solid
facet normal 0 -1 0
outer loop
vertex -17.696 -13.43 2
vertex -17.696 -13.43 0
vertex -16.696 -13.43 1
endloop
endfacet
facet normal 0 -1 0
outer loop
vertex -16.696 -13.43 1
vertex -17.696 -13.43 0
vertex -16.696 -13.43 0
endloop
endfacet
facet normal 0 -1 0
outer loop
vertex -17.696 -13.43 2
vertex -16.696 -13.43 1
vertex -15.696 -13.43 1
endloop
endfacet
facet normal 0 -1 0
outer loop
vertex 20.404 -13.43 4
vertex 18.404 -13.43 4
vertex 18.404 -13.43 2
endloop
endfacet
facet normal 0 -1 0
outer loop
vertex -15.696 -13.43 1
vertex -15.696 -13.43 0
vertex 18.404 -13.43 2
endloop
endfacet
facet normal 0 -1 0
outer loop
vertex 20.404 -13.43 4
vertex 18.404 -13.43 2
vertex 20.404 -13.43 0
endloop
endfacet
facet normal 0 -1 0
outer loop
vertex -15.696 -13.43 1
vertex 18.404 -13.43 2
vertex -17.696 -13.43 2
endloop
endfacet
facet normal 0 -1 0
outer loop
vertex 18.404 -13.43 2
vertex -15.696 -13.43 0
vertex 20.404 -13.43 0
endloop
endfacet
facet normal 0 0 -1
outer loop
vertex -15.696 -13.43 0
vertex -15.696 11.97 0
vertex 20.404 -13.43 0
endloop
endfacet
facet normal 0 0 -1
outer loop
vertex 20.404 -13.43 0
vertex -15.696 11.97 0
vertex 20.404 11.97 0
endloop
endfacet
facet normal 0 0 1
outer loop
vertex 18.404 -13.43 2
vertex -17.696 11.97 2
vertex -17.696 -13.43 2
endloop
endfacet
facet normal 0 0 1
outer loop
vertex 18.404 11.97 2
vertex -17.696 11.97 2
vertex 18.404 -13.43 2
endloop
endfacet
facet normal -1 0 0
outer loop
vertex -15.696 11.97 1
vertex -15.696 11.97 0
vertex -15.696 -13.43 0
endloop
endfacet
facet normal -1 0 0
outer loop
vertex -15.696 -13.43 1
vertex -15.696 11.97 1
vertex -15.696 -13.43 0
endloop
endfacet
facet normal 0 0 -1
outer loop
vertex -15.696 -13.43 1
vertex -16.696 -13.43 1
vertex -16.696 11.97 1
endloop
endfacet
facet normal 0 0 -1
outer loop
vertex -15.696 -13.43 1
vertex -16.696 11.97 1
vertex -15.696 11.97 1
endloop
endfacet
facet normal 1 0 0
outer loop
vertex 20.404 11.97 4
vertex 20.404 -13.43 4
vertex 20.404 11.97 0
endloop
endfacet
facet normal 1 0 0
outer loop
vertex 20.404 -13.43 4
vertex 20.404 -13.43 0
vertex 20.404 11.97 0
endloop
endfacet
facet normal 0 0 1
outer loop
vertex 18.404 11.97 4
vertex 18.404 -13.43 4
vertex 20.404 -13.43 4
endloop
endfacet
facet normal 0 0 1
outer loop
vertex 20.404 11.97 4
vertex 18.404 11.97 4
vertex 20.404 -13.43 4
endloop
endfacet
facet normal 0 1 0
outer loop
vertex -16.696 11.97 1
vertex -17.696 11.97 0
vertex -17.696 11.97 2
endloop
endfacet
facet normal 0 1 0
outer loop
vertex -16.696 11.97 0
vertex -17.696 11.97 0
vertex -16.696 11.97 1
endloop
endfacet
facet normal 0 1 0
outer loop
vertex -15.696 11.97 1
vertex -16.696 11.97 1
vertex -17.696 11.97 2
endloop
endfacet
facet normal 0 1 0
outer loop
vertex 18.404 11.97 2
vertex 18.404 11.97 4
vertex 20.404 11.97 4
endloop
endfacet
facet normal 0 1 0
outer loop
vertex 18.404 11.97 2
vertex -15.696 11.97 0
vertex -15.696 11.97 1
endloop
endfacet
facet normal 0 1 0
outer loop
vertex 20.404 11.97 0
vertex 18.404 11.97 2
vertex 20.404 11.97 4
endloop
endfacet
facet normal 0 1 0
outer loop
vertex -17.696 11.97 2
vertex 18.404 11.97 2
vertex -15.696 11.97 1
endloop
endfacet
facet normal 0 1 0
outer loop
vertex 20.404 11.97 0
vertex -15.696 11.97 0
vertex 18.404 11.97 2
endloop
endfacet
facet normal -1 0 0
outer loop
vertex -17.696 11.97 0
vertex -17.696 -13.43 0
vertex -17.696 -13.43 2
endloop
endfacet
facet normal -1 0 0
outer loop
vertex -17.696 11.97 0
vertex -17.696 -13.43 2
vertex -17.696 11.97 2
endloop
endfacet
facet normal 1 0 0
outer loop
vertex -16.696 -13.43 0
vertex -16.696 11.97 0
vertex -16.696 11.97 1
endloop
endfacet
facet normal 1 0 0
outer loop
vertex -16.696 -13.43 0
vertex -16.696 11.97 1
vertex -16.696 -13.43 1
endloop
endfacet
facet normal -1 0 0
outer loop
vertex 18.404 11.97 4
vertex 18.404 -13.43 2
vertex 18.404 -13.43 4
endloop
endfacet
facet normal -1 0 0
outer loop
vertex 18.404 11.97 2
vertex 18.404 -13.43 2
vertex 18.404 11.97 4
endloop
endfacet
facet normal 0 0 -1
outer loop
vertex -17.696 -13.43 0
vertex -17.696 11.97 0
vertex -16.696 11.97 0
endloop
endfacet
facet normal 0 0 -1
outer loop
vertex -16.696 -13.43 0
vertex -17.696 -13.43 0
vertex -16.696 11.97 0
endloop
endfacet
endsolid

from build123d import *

# Parameters (mm, degrees)
F0_W     = 38.1
F0_H     = 25.4
F1_DEPTH = 2
F2_W     = 2
F2_H     = 25.4
F3_DEPTH = 2
F4_W     = 1
F4_H     = 25.4
F5_DEPTH = 1


with BuildPart() as f1:
    # F0 (on Top) → F1 (new body)
    with BuildSketch(Plane.XY):
        with Locations((1.353553, -0.729692)):
            Rectangle(F0_W, F0_H)
    extrude(amount=F1_DEPTH)

    # F2 (on face) → F3 (join)
    with BuildSketch(Plane.XY.offset(2)):
        with Locations((19.403553, -0.729692)):
            Rectangle(F2_W, F2_H)
    extrude(amount=F3_DEPTH)

    # F4 (on face) → F5 (cut)
    with BuildSketch(Plane(origin=(0, 0, 0), x_dir=(1, 0, 0), z_dir=(0, 0, -1))):
        with Locations((-16.196447, 0.729692)):
            Rectangle(F4_W, F4_H)
    extrude(amount=-F5_DEPTH, mode=Mode.SUBTRACT)


solid = f1.part
